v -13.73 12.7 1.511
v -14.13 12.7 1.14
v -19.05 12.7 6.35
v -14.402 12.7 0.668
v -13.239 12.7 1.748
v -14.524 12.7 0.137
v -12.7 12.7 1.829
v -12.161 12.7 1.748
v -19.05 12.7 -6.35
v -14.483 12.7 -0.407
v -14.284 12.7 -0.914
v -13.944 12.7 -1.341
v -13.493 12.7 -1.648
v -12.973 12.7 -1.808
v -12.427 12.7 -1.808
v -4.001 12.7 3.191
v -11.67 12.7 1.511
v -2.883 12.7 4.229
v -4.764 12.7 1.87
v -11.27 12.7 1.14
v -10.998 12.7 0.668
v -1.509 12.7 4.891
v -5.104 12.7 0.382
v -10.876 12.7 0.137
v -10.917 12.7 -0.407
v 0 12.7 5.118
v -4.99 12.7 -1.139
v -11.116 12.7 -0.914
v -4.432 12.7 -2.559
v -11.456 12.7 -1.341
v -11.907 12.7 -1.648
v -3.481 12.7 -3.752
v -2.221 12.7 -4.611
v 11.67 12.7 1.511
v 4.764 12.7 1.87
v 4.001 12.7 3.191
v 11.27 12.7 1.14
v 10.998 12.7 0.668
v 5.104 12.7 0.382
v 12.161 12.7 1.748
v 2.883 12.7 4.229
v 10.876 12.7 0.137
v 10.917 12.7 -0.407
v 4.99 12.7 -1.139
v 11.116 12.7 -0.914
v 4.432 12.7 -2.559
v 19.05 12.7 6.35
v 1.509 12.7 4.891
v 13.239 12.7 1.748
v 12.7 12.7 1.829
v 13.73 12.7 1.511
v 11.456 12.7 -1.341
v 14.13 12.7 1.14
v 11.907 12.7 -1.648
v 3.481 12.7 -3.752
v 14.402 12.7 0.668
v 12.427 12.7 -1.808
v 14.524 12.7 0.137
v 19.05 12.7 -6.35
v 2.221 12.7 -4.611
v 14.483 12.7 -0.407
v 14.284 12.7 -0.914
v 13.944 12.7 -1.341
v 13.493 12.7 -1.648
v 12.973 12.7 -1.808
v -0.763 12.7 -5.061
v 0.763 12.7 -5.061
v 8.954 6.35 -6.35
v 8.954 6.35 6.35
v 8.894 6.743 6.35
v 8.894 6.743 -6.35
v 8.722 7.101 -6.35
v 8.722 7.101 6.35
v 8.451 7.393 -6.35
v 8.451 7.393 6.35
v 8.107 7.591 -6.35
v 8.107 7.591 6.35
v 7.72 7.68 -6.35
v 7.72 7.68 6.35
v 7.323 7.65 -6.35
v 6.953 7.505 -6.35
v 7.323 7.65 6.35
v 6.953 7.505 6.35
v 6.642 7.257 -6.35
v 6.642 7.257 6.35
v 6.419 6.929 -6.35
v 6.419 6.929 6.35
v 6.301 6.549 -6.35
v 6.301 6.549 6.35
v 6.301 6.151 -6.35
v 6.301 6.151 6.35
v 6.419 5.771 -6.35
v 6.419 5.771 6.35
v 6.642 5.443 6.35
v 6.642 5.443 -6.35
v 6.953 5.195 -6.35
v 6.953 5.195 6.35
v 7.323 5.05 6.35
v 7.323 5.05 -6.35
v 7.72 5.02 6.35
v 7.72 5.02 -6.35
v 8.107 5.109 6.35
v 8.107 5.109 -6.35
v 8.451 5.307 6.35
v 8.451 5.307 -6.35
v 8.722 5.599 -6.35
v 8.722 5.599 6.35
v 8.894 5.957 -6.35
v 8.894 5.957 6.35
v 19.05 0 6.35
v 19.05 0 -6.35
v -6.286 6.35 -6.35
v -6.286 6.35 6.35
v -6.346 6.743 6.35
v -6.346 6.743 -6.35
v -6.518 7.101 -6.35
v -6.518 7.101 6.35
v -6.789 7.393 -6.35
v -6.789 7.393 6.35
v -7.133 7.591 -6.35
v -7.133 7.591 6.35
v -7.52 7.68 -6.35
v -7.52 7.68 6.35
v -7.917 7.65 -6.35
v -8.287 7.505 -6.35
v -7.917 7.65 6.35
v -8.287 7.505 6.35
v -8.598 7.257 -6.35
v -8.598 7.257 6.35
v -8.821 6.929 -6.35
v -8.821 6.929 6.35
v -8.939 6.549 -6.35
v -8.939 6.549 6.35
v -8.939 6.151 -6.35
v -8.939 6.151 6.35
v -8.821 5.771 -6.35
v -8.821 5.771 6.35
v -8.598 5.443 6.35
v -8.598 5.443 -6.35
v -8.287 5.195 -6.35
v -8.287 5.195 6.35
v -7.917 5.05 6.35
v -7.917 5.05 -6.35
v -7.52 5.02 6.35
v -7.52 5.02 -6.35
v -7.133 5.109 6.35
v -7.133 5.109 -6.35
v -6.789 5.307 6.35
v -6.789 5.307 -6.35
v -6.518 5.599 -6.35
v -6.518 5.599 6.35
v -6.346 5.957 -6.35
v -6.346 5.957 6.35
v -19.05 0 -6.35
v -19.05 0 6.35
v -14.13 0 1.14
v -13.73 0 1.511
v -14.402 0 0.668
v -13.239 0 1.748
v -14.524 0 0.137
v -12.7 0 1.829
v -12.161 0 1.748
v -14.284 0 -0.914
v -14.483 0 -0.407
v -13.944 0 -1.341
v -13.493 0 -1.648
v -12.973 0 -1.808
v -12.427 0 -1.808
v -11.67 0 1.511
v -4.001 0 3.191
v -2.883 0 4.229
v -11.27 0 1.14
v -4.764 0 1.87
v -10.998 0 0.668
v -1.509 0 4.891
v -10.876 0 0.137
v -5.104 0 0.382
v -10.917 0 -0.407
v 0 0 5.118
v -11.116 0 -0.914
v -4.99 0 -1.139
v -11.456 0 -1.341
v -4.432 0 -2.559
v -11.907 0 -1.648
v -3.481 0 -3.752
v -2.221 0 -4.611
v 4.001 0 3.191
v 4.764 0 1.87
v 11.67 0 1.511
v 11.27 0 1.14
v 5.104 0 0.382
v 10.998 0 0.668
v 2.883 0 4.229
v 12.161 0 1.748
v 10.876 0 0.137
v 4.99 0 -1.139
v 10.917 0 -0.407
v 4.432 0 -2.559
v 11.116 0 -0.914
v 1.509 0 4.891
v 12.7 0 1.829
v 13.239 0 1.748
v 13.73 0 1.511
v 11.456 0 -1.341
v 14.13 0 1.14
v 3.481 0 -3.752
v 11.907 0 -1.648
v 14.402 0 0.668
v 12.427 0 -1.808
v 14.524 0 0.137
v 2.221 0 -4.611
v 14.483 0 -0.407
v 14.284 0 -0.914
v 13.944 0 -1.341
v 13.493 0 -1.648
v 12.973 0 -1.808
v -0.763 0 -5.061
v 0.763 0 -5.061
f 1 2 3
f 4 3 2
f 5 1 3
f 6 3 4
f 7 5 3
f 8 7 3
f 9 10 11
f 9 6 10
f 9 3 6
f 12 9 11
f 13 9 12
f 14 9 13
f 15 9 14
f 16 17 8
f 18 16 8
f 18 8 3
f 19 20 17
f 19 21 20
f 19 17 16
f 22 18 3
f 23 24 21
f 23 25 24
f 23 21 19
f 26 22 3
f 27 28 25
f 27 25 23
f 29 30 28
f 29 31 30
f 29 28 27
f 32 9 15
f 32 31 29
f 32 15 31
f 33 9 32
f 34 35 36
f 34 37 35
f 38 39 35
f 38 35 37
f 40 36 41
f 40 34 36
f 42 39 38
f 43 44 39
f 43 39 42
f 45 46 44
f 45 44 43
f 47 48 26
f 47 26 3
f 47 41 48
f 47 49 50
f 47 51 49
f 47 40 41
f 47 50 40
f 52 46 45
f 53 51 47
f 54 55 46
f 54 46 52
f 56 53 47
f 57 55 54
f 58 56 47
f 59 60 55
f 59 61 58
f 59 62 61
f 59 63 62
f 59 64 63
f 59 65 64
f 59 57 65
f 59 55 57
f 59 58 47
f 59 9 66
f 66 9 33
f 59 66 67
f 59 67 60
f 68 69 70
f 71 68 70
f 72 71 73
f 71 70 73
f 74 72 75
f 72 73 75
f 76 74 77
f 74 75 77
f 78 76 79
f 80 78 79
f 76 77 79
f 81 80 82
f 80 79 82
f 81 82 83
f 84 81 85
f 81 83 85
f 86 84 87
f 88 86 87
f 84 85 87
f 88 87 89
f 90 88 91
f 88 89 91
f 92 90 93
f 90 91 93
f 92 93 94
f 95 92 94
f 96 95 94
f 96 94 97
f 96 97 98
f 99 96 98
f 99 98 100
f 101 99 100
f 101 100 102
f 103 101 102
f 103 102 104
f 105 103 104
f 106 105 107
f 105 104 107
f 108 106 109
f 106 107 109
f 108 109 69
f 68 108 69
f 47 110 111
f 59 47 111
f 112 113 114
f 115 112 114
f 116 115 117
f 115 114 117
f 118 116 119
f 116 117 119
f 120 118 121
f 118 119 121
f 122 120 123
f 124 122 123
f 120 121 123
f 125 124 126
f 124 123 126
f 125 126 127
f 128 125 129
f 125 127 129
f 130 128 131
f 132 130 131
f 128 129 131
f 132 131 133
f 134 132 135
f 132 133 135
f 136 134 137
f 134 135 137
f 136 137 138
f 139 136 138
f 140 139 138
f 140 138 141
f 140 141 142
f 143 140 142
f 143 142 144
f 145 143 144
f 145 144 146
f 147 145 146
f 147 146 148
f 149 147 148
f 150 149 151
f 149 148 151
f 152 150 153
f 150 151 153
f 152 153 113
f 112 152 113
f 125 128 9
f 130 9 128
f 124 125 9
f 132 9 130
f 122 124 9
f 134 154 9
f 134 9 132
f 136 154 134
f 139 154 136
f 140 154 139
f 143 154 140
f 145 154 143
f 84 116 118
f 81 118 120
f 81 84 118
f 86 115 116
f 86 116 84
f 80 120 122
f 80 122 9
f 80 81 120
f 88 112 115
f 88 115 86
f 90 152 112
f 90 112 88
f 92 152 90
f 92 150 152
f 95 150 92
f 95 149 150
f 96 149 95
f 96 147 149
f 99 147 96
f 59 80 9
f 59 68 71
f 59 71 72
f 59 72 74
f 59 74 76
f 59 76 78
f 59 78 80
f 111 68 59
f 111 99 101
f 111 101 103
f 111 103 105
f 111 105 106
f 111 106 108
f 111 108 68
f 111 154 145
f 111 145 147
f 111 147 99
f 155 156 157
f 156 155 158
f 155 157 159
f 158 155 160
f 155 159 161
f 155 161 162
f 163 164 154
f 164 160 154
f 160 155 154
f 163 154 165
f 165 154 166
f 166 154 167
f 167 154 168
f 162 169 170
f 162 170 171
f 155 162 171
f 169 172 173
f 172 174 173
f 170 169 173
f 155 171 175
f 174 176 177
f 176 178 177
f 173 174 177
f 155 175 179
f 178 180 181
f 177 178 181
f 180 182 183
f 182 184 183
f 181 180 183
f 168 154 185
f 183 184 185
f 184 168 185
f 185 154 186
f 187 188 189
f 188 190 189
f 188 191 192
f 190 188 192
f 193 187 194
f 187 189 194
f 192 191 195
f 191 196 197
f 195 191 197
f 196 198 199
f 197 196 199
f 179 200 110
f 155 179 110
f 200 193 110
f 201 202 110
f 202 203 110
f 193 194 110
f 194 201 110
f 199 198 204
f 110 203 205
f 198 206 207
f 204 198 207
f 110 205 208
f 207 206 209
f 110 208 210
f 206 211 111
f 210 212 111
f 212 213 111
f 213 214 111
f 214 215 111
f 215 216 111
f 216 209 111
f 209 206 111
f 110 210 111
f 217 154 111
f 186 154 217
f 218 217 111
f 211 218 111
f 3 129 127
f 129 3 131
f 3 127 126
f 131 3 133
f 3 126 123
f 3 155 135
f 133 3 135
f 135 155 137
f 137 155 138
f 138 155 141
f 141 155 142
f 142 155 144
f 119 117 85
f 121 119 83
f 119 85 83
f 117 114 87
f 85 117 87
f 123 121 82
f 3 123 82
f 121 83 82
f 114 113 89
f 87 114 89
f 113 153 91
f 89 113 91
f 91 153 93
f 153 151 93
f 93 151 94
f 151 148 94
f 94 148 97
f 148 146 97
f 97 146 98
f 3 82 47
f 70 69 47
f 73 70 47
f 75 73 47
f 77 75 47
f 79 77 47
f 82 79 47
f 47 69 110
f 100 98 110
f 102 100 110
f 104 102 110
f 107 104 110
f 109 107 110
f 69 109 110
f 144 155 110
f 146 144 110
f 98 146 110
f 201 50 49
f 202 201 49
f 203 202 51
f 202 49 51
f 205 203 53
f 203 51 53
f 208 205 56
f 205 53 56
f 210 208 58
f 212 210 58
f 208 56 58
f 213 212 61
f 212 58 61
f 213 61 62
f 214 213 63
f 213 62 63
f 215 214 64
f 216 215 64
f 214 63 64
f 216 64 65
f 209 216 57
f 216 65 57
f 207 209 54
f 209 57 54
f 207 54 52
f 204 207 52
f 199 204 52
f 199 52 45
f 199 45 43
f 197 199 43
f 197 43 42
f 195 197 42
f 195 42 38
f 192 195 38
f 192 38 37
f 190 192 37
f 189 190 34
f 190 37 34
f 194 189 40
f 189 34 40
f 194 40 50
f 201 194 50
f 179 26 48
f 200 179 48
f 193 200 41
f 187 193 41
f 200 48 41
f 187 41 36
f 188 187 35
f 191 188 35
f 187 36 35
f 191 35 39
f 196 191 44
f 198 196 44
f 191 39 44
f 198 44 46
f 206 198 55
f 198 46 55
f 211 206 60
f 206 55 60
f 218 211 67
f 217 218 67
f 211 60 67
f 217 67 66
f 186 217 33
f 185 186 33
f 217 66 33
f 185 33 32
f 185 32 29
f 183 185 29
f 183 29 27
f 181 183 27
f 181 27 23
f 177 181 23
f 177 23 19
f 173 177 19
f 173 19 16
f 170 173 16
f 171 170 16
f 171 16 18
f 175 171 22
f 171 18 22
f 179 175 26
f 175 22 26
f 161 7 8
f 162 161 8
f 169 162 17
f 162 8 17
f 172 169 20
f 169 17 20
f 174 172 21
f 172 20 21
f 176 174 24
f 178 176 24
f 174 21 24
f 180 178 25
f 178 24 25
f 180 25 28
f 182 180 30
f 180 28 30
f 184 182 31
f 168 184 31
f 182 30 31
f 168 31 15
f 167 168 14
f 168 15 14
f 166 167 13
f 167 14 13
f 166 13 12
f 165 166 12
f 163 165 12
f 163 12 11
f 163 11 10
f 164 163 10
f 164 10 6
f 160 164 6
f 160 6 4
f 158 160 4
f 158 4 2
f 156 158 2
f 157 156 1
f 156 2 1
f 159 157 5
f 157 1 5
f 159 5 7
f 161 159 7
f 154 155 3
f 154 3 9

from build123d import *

# Parameters (mm, degrees)
SKETCH1_W           = 38.1
SKETCH1_H           = 12.7
BOSS_EXTRUDE1_DEPTH = 12.7
SKETCH2_R           = 5.1181
SKETCH2_R_2         = 1.8288
CUT_EXTRUDE1_DEPTH  = 12.7
SKETCH3_R           = 1.3335
CUT_EXTRUDE2_DEPTH  = 12.7


with BuildPart() as part:
    # Sketch1 → Boss-Extrude1 (new body)
    with BuildSketch(Plane(origin=(0, 0, 0), x_dir=(1, 0, 0), z_dir=(0, 1, 0))):
        Rectangle(SKETCH1_W, SKETCH1_H)
    extrude(amount=BOSS_EXTRUDE1_DEPTH)

    # Sketch2 → Cut-Extrude1 (cut)
    with BuildSketch(Plane(origin=(0, 12.7, 0), x_dir=(1, 0, 0), z_dir=(0, 1, 0))):
        with Locations(Location((0, 0, 0), (0, 0, 270))):
            Circle(SKETCH2_R)
        with Locations(Location((-12.7, 0, 0), (0, 0, 270))):
            Circle(SKETCH2_R_2)
        with Locations(Location((12.7, 0, 0), (0, 0, 270))):
            Circle(SKETCH2_R_2)
    extrude(amount=-CUT_EXTRUDE1_DEPTH, mode=Mode.SUBTRACT)

    # Sketch3 → Cut-Extrude2 (cut)
    with BuildSketch(Plane.XY.offset(6.35)):
        with Locations((-7.62, 6.35)):
            Circle(SKETCH3_R)
        with Locations((7.62, 6.35)):
            Circle(SKETCH3_R)
    extrude(amount=-CUT_EXTRUDE2_DEPTH, mode=Mode.SUBTRACT)


solid = part.part
